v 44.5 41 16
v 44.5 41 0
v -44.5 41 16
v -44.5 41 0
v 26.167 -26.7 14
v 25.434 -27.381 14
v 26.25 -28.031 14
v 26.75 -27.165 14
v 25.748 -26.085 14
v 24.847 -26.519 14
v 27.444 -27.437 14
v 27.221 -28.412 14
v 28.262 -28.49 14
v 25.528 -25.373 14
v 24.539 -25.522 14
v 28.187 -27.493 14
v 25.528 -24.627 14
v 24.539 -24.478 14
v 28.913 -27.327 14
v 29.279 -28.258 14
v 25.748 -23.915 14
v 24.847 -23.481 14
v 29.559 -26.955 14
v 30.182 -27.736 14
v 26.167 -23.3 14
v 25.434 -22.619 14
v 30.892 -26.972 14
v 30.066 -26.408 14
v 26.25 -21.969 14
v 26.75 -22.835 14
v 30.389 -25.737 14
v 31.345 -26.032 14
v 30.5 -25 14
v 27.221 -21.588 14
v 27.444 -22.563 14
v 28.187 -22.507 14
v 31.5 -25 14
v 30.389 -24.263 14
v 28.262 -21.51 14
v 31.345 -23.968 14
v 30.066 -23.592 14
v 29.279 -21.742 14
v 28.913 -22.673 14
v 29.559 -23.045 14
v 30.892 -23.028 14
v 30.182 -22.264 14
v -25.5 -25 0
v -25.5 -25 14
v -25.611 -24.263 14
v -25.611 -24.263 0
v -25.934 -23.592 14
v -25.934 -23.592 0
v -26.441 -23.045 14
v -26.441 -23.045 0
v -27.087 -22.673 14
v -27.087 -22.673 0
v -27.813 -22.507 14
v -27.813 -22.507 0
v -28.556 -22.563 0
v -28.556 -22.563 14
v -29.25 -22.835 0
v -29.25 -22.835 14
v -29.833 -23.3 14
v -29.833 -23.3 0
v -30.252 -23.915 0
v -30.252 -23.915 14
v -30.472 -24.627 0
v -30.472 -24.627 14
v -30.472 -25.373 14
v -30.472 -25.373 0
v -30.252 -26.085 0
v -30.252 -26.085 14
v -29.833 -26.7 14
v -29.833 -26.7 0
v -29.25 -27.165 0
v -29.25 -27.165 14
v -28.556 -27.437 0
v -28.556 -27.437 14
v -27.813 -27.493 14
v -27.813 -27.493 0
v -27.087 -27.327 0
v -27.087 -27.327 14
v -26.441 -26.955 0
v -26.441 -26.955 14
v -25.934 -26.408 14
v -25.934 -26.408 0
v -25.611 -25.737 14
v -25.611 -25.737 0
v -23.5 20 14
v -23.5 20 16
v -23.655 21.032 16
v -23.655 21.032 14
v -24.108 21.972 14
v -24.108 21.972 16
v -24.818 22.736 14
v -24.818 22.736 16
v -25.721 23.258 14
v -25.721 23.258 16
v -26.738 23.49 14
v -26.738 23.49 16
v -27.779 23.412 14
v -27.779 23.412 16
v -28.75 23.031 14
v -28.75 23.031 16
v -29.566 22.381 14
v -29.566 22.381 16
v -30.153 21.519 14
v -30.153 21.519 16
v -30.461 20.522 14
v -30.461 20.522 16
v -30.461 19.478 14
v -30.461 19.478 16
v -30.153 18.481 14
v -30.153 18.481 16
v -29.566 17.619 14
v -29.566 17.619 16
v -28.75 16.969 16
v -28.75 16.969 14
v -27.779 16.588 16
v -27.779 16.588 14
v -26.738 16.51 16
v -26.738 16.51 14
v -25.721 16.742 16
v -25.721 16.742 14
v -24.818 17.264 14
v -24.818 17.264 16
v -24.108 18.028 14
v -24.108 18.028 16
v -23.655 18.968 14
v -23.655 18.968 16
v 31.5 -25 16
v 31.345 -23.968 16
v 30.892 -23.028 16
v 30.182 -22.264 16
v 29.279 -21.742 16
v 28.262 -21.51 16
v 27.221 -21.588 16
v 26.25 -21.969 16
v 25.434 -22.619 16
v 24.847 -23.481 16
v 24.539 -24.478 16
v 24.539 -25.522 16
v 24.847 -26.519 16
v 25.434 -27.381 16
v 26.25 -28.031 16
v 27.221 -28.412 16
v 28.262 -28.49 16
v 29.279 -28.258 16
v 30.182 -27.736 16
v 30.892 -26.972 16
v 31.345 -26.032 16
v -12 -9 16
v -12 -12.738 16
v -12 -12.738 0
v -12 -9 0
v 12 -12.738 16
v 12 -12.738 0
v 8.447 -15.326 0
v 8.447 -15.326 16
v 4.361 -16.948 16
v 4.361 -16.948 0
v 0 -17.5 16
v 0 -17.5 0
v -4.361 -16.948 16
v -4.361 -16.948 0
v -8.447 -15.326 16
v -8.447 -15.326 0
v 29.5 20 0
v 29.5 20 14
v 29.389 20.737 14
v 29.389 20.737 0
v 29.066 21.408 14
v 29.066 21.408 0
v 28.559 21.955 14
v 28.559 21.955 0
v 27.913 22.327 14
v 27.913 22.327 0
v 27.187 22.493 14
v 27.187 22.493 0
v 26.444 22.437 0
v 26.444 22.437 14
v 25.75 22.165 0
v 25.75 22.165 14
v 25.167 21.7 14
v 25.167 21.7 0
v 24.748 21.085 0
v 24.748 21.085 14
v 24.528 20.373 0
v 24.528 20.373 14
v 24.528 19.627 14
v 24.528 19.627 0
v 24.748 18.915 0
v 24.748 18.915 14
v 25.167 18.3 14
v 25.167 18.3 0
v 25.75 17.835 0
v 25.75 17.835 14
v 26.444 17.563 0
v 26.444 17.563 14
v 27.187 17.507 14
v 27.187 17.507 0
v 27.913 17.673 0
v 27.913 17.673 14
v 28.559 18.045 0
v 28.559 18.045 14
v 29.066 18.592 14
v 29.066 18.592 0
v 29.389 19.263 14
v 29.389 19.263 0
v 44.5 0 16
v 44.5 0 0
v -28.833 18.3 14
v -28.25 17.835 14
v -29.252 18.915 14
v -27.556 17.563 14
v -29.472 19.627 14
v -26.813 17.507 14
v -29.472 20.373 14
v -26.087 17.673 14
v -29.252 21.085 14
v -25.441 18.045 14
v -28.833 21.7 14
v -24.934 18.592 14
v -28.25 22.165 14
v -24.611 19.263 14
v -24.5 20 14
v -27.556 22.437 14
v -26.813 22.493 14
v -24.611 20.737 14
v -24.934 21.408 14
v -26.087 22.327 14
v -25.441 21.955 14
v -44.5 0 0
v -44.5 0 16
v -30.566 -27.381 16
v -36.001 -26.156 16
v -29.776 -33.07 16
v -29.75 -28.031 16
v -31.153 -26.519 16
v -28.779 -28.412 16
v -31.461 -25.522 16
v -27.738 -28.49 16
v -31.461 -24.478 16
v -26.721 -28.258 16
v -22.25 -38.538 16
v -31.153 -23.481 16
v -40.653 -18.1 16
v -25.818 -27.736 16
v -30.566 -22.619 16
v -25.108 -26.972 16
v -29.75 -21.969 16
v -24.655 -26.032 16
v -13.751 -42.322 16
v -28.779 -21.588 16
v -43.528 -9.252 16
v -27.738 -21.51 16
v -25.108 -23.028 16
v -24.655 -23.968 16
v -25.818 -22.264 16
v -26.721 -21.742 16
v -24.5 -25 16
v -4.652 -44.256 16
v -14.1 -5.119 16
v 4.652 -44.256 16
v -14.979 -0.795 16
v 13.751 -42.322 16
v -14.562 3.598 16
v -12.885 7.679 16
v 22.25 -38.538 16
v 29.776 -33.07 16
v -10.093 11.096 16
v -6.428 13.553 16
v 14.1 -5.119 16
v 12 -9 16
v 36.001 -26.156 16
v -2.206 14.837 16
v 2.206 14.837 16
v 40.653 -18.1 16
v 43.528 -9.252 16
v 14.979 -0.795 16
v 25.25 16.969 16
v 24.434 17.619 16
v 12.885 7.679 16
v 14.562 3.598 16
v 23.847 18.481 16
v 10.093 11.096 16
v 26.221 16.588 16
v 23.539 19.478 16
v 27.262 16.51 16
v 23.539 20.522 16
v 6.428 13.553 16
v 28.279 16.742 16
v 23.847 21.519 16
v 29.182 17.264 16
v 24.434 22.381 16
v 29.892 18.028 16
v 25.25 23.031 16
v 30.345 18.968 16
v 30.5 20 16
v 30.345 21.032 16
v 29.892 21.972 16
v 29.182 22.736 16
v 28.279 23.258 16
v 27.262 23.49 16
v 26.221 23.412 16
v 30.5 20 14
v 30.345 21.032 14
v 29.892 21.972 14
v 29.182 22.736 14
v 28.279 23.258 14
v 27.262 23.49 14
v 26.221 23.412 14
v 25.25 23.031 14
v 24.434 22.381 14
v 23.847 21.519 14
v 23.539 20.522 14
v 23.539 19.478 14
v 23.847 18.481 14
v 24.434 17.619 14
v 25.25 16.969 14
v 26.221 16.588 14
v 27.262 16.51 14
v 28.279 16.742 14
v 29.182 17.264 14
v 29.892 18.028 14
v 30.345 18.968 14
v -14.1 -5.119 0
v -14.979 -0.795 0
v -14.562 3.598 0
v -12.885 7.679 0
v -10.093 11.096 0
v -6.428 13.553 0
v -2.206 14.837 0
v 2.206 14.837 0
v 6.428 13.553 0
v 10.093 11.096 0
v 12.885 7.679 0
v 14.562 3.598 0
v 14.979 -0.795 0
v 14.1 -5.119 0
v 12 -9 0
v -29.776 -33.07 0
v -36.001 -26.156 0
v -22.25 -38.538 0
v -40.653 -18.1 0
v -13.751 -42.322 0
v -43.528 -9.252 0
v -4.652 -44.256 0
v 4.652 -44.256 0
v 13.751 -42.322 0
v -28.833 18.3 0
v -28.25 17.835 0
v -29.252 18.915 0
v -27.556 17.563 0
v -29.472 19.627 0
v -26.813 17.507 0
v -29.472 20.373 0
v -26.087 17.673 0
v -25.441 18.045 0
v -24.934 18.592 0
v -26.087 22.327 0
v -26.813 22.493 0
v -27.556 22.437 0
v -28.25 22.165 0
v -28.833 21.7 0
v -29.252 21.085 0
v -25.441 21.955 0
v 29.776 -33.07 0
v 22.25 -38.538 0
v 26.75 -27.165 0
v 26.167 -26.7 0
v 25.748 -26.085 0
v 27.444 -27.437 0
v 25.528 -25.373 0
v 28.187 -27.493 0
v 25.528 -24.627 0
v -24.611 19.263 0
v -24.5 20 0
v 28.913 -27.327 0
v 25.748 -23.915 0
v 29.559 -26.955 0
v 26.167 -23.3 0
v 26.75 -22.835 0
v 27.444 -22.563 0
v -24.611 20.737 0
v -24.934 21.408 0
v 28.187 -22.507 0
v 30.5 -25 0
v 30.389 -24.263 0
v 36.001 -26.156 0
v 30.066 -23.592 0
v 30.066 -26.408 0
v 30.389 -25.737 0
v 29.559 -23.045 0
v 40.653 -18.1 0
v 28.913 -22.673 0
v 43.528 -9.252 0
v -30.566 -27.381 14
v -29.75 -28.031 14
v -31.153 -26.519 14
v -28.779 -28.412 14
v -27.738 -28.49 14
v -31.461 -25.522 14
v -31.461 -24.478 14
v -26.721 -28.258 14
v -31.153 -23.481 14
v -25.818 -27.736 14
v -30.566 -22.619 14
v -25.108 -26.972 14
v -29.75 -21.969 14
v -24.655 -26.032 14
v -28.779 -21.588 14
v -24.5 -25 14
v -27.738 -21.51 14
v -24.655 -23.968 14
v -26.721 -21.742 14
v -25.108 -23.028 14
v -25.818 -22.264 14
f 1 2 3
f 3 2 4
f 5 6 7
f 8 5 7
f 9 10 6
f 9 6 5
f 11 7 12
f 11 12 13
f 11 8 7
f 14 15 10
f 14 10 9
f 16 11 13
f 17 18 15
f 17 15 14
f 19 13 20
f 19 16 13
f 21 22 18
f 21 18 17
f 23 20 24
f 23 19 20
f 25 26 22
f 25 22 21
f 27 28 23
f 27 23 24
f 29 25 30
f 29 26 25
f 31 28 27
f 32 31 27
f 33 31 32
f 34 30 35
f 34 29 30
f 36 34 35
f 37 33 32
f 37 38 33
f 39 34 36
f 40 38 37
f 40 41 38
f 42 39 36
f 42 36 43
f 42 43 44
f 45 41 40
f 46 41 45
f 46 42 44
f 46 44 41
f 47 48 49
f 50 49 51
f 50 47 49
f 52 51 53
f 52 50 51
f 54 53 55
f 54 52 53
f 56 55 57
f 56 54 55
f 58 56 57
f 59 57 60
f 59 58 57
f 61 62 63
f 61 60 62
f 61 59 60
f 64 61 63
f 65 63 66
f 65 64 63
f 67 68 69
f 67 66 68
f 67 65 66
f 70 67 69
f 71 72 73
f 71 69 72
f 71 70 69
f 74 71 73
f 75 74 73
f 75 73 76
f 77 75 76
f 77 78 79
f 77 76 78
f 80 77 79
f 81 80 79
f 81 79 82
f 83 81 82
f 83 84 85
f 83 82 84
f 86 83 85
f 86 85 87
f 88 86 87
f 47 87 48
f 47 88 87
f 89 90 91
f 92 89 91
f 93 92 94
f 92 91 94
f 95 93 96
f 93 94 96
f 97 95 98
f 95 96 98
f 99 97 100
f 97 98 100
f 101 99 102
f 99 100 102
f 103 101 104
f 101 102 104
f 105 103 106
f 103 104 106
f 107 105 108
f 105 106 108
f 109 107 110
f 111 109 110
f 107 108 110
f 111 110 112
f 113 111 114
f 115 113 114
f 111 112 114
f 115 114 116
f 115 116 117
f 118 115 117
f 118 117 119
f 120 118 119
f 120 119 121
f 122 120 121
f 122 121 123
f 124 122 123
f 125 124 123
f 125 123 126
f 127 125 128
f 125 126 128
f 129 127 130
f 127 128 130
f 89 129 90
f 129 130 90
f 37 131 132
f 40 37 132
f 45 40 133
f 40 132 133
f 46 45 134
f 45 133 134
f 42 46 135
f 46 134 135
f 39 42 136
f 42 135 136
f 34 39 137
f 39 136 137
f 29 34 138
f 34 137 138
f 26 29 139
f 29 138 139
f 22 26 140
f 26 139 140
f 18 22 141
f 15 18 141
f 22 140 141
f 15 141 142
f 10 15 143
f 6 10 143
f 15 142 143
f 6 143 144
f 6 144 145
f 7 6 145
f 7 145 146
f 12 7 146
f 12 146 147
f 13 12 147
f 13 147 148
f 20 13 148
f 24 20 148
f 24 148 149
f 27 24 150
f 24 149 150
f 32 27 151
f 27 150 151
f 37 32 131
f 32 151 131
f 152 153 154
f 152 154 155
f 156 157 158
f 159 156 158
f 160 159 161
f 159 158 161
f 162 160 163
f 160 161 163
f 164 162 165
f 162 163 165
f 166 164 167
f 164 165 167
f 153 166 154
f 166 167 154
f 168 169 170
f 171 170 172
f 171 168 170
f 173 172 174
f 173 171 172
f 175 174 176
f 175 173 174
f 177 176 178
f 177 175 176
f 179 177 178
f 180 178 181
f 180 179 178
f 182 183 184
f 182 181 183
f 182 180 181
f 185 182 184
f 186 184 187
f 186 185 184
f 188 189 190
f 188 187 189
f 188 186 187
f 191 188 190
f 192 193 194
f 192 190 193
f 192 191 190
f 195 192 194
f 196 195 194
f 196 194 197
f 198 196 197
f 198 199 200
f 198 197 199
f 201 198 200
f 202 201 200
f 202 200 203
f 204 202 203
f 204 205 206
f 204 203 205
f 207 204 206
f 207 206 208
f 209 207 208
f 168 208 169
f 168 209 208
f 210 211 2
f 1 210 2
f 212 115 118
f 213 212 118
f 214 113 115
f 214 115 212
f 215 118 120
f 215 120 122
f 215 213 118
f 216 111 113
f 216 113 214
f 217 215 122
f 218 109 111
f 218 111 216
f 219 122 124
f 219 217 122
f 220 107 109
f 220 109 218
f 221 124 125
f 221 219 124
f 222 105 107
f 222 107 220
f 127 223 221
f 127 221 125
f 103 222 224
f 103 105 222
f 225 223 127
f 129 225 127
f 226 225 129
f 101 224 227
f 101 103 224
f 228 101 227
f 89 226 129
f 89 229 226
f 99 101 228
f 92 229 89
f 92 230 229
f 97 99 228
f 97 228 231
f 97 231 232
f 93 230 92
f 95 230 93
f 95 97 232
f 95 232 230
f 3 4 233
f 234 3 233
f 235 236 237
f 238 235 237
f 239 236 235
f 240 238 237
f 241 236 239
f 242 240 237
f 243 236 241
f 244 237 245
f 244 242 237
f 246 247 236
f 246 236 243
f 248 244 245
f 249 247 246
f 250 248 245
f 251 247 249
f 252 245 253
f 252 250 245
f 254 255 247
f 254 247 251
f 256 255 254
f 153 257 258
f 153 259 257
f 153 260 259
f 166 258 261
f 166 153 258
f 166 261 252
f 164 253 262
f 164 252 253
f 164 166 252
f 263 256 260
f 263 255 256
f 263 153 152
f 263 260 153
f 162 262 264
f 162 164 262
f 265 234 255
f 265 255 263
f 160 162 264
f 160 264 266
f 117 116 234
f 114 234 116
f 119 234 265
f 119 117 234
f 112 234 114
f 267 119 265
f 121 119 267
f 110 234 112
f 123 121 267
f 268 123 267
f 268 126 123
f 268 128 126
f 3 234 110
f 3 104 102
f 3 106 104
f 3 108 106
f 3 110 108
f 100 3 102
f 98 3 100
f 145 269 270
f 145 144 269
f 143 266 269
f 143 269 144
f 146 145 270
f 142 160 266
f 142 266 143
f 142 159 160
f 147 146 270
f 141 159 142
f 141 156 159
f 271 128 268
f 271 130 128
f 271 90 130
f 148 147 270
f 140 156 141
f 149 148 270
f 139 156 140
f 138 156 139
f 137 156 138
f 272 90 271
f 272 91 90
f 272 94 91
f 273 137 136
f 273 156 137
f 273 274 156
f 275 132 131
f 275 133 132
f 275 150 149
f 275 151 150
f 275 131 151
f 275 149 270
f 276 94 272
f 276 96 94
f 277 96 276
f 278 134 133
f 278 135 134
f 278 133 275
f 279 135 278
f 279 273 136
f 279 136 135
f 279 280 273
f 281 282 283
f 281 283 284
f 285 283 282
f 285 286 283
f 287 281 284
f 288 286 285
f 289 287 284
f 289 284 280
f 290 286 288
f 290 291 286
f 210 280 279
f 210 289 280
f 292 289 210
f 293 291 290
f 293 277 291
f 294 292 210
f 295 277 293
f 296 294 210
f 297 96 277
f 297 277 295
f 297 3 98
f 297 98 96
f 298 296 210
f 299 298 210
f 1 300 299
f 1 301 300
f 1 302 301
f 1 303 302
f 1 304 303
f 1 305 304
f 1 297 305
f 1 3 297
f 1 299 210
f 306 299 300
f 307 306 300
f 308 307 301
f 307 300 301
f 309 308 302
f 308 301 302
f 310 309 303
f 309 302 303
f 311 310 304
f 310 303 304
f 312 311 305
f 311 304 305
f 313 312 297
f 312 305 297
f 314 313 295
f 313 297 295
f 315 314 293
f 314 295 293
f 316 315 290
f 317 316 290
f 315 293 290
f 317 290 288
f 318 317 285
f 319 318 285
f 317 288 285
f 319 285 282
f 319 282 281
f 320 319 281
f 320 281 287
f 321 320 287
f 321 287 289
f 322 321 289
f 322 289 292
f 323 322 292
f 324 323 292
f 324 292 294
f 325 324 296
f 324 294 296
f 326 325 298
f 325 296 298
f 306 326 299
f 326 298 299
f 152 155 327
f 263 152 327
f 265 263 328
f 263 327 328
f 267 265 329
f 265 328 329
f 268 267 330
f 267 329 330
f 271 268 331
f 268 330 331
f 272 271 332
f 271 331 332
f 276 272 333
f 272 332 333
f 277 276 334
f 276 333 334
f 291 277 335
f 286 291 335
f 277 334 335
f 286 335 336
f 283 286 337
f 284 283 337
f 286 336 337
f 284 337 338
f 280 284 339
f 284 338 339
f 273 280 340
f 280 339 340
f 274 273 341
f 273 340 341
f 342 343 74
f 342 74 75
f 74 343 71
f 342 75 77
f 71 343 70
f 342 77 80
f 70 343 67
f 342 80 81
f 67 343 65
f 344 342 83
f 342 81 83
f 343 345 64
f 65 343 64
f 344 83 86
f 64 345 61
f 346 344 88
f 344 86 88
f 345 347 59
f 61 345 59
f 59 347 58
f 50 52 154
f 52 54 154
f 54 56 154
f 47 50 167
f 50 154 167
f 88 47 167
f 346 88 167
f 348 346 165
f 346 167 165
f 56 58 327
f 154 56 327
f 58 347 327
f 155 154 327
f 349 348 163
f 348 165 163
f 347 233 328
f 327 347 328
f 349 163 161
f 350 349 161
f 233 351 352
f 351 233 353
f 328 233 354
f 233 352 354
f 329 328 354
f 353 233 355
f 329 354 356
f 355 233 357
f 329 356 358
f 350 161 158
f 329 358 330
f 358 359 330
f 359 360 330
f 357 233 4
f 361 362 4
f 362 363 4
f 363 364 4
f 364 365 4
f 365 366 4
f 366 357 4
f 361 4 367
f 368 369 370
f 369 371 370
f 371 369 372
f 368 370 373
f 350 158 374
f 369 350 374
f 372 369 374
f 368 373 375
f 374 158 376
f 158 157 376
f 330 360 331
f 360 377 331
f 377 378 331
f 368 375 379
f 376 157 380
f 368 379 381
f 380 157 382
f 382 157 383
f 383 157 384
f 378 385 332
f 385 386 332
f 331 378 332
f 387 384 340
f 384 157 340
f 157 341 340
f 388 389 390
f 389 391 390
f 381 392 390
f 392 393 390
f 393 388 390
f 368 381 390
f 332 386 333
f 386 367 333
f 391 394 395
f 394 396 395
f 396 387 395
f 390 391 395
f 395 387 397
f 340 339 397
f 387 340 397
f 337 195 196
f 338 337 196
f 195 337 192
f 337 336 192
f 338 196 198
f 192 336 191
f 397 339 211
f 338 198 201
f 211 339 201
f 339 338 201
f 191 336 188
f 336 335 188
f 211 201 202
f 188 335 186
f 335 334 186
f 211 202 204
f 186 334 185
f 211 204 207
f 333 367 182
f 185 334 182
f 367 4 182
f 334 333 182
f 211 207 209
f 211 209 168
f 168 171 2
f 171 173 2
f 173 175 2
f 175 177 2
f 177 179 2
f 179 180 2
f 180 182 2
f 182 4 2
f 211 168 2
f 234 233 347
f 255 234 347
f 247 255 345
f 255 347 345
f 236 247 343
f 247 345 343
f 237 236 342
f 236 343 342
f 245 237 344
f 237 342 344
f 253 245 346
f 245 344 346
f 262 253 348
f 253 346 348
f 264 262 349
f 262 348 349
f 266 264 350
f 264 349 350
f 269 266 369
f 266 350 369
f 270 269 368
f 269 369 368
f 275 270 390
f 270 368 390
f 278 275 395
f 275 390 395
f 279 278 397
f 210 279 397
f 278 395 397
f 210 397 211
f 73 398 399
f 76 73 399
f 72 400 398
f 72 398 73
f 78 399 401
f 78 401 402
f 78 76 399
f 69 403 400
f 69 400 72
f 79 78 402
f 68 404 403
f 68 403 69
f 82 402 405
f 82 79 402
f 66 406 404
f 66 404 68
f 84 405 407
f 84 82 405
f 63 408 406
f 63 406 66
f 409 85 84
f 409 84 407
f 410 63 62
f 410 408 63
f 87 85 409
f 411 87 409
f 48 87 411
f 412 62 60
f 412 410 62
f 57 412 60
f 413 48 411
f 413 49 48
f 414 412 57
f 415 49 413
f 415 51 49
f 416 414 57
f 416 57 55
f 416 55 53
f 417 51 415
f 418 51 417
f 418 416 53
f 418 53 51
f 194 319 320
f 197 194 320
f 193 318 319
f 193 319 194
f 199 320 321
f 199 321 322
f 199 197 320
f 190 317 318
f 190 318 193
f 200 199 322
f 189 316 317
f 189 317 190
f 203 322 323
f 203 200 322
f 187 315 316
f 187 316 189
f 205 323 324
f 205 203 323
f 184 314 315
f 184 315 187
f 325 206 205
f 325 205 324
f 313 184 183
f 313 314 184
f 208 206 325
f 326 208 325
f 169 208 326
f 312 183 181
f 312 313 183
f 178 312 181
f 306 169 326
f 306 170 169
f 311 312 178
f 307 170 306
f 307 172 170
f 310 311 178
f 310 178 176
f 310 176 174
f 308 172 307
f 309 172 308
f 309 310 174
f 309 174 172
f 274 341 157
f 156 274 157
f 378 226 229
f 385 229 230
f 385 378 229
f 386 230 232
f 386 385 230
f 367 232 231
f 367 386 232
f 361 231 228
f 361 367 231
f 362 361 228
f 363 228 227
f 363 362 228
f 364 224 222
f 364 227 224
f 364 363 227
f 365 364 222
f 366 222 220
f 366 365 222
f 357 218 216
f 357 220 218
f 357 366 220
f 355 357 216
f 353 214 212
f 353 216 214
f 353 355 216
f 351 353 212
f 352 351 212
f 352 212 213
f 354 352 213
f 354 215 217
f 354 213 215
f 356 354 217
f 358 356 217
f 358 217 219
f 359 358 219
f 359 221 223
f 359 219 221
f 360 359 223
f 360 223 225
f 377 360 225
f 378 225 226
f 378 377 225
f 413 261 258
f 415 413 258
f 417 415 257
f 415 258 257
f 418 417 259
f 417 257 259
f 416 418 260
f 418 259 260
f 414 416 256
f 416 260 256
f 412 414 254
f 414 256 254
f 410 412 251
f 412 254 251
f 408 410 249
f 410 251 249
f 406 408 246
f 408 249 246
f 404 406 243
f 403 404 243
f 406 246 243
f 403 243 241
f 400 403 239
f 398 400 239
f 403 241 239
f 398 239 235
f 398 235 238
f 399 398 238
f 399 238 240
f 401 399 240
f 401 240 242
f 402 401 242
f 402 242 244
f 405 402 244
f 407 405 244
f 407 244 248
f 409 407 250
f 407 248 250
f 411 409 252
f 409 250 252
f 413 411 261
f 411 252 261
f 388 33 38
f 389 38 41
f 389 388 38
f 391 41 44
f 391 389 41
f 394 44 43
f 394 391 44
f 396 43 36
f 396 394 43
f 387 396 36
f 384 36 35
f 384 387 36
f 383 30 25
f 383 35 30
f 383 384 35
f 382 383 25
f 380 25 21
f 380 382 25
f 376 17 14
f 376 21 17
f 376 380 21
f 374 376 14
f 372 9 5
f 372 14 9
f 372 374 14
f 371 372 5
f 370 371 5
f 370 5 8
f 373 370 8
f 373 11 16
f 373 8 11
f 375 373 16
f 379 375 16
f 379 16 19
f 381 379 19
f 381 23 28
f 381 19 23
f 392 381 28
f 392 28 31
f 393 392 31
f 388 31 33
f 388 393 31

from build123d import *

# Parameters (mm, degrees)
F0_R     = 2.5
F1_DEPTH = 16
F2_R     = 3.5
F3_DEPTH = 2


with BuildPart() as f1:
    # F0 (on Top) → F1 (new body)
    with BuildSketch(Plane.XY):
        with BuildLine():
            Line((44.5, 41), (-44.5, 41))
            Line((-44.5, 41), (-44.5, 0))
            ThreePointArc((-44.5, 0), (0, -44.5), (44.5, 0))
            Line((44.5, 0), (44.5, 41))
        make_face()
        with Locations((-28, -25)):
            Circle(F0_R, mode=Mode.SUBTRACT)
        with Locations((28, -25)):
            Circle(F0_R, mode=Mode.SUBTRACT)
        with Locations((-27, 20)):
            Circle(F0_R, mode=Mode.SUBTRACT)
        with BuildLine():
            ThreePointArc((-12, -9), (0, 15), (12, -9))
            Line((12, -9), (12, -12.737739))
            ThreePointArc((12, -12.737739), (0, -17.5), (-12, -12.737739))
            Line((-12, -12.737739), (-12, -9))
        make_face(mode=Mode.SUBTRACT)
        with Locations((27, 20)):
            Circle(F0_R, mode=Mode.SUBTRACT)
    extrude(amount=F1_DEPTH)

    # F2 (on face) → F3 (cut)
    with BuildSketch(Plane.XY.offset(16)):
        with Locations((-27, 20)):
            Circle(F2_R)
        with Locations((-28, -25)):
            Circle(F2_R)
        with Locations((27, 20)):
            Circle(F2_R)
        with Locations((28, -25)):
            Circle(F2_R)
    extrude(amount=-F3_DEPTH, mode=Mode.SUBTRACT)


solid = f1.part
